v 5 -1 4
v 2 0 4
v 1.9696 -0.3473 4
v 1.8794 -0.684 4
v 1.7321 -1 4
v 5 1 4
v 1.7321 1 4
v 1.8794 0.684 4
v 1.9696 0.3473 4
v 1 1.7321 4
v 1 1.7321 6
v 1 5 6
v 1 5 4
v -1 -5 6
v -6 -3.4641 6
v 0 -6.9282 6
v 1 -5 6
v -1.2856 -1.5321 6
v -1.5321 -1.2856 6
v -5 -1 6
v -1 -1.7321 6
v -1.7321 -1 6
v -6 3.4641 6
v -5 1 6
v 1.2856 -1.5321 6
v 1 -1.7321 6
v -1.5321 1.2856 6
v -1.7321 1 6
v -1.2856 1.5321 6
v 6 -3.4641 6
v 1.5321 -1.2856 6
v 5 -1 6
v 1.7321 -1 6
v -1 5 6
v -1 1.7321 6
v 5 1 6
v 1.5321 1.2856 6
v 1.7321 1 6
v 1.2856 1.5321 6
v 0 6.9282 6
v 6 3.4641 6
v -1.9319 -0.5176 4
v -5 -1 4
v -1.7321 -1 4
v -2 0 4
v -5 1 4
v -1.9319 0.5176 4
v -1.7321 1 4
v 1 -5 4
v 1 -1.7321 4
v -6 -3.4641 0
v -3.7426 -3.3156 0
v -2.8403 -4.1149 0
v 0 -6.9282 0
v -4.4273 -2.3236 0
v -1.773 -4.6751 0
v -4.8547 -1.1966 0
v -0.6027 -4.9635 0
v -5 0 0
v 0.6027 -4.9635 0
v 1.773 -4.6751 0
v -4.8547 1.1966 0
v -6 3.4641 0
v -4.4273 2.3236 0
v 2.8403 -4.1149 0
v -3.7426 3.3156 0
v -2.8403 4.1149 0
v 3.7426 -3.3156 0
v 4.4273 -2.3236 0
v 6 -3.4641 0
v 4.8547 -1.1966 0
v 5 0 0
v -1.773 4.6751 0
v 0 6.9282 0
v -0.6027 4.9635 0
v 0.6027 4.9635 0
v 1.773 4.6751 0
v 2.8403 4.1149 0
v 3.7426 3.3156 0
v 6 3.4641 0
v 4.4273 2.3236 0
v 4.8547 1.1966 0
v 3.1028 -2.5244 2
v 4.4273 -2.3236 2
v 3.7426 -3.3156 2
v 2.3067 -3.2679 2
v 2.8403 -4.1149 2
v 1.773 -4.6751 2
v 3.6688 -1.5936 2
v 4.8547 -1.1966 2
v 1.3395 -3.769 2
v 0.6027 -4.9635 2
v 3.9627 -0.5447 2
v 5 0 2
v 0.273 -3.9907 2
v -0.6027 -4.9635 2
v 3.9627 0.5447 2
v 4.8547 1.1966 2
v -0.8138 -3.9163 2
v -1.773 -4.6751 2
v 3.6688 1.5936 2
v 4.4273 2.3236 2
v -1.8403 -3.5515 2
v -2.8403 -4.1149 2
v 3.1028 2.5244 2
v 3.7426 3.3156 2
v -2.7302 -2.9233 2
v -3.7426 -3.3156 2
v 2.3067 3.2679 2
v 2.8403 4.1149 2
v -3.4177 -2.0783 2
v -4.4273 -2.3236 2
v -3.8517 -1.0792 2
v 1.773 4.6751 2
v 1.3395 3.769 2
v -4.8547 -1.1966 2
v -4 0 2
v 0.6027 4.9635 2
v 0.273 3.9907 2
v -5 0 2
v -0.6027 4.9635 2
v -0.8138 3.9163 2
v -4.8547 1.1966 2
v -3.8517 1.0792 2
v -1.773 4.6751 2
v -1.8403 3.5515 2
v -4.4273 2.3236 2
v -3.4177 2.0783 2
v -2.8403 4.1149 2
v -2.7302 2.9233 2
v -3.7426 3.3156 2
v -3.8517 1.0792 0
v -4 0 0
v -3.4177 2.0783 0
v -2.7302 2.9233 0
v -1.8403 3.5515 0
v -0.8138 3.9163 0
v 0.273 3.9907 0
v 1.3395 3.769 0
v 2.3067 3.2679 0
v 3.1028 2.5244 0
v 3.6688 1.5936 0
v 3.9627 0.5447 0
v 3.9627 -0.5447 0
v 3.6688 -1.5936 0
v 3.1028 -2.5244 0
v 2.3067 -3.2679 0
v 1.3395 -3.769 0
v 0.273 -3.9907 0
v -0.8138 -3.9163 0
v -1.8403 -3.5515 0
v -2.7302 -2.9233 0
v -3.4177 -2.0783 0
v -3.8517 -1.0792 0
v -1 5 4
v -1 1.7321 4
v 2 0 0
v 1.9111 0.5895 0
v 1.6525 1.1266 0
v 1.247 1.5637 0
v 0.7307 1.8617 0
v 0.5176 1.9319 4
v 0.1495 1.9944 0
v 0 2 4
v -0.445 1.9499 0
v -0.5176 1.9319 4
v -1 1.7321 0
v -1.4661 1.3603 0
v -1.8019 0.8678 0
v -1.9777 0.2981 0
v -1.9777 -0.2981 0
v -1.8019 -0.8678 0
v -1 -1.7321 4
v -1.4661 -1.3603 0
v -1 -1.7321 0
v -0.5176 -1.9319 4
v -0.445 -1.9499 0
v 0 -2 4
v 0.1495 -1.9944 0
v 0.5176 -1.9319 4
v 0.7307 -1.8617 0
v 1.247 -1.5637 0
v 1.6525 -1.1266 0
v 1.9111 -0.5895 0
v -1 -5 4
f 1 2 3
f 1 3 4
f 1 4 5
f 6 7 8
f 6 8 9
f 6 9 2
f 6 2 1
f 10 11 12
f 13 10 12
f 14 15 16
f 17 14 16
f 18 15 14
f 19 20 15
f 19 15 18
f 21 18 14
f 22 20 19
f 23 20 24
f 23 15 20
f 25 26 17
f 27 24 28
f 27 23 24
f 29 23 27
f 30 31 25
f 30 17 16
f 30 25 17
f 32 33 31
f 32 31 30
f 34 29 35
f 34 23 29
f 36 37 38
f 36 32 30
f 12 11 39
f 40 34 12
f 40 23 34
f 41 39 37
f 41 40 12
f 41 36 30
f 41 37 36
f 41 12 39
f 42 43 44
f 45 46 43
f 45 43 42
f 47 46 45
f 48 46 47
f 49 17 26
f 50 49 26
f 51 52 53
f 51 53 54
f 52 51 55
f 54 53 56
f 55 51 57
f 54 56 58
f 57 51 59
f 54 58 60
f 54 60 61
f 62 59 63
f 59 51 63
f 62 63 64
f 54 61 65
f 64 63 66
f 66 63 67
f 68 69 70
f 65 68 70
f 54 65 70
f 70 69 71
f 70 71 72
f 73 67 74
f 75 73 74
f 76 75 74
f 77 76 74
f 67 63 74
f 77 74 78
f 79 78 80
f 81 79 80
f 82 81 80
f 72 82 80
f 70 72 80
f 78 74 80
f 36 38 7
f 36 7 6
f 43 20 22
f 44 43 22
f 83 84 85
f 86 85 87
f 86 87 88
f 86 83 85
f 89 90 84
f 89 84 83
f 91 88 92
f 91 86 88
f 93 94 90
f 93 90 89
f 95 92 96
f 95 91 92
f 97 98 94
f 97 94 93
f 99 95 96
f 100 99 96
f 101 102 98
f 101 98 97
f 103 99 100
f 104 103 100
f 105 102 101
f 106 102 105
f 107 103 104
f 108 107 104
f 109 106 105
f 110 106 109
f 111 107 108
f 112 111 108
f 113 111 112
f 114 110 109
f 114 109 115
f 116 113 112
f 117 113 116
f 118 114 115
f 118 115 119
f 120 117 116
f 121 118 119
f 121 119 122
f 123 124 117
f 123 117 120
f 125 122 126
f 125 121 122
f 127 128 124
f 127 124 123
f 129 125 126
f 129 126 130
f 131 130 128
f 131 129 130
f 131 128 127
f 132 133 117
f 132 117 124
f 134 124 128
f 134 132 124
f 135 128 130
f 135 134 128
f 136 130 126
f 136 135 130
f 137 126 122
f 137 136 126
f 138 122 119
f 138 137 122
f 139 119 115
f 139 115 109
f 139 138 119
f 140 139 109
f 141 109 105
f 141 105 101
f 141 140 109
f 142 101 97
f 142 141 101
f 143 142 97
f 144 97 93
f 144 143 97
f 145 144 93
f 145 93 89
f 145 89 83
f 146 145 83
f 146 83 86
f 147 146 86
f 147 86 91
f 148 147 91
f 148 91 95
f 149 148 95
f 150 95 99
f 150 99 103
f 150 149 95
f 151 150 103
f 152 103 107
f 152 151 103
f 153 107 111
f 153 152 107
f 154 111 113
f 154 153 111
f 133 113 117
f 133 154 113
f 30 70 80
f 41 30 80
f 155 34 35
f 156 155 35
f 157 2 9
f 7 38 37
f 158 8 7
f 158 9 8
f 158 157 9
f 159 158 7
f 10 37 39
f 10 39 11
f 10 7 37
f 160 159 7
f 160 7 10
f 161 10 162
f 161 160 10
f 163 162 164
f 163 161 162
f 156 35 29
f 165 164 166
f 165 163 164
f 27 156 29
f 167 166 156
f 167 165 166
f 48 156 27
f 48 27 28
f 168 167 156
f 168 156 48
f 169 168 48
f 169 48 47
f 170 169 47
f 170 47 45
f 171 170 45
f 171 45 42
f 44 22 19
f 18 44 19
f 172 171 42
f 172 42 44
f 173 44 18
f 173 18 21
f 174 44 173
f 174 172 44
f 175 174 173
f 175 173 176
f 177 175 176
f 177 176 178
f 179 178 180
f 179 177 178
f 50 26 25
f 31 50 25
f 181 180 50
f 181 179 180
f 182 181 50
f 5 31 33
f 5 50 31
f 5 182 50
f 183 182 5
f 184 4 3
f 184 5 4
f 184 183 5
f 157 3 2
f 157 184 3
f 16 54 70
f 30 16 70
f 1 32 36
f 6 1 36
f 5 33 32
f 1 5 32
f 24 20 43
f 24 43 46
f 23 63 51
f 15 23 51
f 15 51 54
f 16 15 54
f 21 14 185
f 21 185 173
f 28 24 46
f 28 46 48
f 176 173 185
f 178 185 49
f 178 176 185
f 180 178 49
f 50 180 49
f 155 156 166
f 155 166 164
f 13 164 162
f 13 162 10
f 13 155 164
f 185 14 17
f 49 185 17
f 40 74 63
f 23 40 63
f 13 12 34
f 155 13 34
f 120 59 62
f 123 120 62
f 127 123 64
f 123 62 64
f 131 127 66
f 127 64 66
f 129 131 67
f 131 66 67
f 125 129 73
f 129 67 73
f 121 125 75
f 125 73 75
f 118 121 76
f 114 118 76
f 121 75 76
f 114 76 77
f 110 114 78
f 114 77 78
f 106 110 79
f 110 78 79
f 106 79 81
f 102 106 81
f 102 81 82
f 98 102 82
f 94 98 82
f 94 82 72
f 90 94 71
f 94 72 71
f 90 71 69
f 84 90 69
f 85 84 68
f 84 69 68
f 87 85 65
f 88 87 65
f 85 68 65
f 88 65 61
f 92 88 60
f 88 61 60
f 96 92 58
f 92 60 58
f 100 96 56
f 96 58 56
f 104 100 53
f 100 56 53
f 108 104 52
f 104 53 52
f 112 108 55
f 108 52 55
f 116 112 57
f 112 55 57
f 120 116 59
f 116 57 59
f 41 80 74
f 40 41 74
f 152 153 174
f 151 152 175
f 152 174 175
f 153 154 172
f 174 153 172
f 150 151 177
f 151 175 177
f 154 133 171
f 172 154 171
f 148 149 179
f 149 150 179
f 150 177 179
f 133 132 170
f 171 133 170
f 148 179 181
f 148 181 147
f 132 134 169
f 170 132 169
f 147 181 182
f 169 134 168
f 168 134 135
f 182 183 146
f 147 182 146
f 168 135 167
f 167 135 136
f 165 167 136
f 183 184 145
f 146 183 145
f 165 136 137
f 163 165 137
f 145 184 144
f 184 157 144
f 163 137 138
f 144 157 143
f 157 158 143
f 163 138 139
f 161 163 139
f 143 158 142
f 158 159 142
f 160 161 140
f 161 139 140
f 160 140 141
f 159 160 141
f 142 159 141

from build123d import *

# Parameters (mm, degrees)
ESQUISSE1_R             = 2
BASE_EXTRUSION_DEPTH    = 6
ESQUISSE2_W             = 4
ESQUISSE2_H             = 2
ESQUISSE2_W_2           = 2
ESQUISSE2_H_2           = 4
ENL_V_MAT_EXTRU_1_DEPTH = 2
ESQUISSE3_R             = 5
ESQUISSE3_R_2           = 4
ENL_V_MAT_EXTRU_2_DEPTH = 2


with BuildPart() as part:
    # Esquisse1 → Base-Extrusion (new body)
    with BuildSketch(Plane.XY):
        Polygon((0, 6.92820323), (-6, 3.464101615), (-6, -3.464101615), (0, -6.92820323), (6, -3.464101615), (6, 3.464101615), align=None)
        Circle(ESQUISSE1_R, mode=Mode.SUBTRACT)
    extrude(amount=BASE_EXTRUSION_DEPTH)

    # Esquisse2 → Enlèv. mat.-Extru.1 (cut)
    with BuildSketch(Plane.XY.offset(6)):
        Polygon((1, 1), (1, 5), (-1, 5), (-1, 1), (-1, -1), (1, -1), align=None)
        with Locations((3, 0)):
            Rectangle(ESQUISSE2_W, ESQUISSE2_H)
        with Locations((-3, 0)):
            Rectangle(ESQUISSE2_W, ESQUISSE2_H)
        with Locations((0, -3)):
            Rectangle(ESQUISSE2_W_2, ESQUISSE2_H_2)
    extrude(amount=-ENL_V_MAT_EXTRU_1_DEPTH, mode=Mode.SUBTRACT)

    # Esquisse3 → Enlèv. mat.-Extru.2 (cut)
    with BuildSketch(Plane(origin=(0, 0, 0), x_dir=(-1, 0, 0), z_dir=(0, 0, -1))):
        Circle(ESQUISSE3_R)
        Circle(ESQUISSE3_R_2, mode=Mode.SUBTRACT)
    extrude(amount=-ENL_V_MAT_EXTRU_2_DEPTH, mode=Mode.SUBTRACT)


solid = part.part
